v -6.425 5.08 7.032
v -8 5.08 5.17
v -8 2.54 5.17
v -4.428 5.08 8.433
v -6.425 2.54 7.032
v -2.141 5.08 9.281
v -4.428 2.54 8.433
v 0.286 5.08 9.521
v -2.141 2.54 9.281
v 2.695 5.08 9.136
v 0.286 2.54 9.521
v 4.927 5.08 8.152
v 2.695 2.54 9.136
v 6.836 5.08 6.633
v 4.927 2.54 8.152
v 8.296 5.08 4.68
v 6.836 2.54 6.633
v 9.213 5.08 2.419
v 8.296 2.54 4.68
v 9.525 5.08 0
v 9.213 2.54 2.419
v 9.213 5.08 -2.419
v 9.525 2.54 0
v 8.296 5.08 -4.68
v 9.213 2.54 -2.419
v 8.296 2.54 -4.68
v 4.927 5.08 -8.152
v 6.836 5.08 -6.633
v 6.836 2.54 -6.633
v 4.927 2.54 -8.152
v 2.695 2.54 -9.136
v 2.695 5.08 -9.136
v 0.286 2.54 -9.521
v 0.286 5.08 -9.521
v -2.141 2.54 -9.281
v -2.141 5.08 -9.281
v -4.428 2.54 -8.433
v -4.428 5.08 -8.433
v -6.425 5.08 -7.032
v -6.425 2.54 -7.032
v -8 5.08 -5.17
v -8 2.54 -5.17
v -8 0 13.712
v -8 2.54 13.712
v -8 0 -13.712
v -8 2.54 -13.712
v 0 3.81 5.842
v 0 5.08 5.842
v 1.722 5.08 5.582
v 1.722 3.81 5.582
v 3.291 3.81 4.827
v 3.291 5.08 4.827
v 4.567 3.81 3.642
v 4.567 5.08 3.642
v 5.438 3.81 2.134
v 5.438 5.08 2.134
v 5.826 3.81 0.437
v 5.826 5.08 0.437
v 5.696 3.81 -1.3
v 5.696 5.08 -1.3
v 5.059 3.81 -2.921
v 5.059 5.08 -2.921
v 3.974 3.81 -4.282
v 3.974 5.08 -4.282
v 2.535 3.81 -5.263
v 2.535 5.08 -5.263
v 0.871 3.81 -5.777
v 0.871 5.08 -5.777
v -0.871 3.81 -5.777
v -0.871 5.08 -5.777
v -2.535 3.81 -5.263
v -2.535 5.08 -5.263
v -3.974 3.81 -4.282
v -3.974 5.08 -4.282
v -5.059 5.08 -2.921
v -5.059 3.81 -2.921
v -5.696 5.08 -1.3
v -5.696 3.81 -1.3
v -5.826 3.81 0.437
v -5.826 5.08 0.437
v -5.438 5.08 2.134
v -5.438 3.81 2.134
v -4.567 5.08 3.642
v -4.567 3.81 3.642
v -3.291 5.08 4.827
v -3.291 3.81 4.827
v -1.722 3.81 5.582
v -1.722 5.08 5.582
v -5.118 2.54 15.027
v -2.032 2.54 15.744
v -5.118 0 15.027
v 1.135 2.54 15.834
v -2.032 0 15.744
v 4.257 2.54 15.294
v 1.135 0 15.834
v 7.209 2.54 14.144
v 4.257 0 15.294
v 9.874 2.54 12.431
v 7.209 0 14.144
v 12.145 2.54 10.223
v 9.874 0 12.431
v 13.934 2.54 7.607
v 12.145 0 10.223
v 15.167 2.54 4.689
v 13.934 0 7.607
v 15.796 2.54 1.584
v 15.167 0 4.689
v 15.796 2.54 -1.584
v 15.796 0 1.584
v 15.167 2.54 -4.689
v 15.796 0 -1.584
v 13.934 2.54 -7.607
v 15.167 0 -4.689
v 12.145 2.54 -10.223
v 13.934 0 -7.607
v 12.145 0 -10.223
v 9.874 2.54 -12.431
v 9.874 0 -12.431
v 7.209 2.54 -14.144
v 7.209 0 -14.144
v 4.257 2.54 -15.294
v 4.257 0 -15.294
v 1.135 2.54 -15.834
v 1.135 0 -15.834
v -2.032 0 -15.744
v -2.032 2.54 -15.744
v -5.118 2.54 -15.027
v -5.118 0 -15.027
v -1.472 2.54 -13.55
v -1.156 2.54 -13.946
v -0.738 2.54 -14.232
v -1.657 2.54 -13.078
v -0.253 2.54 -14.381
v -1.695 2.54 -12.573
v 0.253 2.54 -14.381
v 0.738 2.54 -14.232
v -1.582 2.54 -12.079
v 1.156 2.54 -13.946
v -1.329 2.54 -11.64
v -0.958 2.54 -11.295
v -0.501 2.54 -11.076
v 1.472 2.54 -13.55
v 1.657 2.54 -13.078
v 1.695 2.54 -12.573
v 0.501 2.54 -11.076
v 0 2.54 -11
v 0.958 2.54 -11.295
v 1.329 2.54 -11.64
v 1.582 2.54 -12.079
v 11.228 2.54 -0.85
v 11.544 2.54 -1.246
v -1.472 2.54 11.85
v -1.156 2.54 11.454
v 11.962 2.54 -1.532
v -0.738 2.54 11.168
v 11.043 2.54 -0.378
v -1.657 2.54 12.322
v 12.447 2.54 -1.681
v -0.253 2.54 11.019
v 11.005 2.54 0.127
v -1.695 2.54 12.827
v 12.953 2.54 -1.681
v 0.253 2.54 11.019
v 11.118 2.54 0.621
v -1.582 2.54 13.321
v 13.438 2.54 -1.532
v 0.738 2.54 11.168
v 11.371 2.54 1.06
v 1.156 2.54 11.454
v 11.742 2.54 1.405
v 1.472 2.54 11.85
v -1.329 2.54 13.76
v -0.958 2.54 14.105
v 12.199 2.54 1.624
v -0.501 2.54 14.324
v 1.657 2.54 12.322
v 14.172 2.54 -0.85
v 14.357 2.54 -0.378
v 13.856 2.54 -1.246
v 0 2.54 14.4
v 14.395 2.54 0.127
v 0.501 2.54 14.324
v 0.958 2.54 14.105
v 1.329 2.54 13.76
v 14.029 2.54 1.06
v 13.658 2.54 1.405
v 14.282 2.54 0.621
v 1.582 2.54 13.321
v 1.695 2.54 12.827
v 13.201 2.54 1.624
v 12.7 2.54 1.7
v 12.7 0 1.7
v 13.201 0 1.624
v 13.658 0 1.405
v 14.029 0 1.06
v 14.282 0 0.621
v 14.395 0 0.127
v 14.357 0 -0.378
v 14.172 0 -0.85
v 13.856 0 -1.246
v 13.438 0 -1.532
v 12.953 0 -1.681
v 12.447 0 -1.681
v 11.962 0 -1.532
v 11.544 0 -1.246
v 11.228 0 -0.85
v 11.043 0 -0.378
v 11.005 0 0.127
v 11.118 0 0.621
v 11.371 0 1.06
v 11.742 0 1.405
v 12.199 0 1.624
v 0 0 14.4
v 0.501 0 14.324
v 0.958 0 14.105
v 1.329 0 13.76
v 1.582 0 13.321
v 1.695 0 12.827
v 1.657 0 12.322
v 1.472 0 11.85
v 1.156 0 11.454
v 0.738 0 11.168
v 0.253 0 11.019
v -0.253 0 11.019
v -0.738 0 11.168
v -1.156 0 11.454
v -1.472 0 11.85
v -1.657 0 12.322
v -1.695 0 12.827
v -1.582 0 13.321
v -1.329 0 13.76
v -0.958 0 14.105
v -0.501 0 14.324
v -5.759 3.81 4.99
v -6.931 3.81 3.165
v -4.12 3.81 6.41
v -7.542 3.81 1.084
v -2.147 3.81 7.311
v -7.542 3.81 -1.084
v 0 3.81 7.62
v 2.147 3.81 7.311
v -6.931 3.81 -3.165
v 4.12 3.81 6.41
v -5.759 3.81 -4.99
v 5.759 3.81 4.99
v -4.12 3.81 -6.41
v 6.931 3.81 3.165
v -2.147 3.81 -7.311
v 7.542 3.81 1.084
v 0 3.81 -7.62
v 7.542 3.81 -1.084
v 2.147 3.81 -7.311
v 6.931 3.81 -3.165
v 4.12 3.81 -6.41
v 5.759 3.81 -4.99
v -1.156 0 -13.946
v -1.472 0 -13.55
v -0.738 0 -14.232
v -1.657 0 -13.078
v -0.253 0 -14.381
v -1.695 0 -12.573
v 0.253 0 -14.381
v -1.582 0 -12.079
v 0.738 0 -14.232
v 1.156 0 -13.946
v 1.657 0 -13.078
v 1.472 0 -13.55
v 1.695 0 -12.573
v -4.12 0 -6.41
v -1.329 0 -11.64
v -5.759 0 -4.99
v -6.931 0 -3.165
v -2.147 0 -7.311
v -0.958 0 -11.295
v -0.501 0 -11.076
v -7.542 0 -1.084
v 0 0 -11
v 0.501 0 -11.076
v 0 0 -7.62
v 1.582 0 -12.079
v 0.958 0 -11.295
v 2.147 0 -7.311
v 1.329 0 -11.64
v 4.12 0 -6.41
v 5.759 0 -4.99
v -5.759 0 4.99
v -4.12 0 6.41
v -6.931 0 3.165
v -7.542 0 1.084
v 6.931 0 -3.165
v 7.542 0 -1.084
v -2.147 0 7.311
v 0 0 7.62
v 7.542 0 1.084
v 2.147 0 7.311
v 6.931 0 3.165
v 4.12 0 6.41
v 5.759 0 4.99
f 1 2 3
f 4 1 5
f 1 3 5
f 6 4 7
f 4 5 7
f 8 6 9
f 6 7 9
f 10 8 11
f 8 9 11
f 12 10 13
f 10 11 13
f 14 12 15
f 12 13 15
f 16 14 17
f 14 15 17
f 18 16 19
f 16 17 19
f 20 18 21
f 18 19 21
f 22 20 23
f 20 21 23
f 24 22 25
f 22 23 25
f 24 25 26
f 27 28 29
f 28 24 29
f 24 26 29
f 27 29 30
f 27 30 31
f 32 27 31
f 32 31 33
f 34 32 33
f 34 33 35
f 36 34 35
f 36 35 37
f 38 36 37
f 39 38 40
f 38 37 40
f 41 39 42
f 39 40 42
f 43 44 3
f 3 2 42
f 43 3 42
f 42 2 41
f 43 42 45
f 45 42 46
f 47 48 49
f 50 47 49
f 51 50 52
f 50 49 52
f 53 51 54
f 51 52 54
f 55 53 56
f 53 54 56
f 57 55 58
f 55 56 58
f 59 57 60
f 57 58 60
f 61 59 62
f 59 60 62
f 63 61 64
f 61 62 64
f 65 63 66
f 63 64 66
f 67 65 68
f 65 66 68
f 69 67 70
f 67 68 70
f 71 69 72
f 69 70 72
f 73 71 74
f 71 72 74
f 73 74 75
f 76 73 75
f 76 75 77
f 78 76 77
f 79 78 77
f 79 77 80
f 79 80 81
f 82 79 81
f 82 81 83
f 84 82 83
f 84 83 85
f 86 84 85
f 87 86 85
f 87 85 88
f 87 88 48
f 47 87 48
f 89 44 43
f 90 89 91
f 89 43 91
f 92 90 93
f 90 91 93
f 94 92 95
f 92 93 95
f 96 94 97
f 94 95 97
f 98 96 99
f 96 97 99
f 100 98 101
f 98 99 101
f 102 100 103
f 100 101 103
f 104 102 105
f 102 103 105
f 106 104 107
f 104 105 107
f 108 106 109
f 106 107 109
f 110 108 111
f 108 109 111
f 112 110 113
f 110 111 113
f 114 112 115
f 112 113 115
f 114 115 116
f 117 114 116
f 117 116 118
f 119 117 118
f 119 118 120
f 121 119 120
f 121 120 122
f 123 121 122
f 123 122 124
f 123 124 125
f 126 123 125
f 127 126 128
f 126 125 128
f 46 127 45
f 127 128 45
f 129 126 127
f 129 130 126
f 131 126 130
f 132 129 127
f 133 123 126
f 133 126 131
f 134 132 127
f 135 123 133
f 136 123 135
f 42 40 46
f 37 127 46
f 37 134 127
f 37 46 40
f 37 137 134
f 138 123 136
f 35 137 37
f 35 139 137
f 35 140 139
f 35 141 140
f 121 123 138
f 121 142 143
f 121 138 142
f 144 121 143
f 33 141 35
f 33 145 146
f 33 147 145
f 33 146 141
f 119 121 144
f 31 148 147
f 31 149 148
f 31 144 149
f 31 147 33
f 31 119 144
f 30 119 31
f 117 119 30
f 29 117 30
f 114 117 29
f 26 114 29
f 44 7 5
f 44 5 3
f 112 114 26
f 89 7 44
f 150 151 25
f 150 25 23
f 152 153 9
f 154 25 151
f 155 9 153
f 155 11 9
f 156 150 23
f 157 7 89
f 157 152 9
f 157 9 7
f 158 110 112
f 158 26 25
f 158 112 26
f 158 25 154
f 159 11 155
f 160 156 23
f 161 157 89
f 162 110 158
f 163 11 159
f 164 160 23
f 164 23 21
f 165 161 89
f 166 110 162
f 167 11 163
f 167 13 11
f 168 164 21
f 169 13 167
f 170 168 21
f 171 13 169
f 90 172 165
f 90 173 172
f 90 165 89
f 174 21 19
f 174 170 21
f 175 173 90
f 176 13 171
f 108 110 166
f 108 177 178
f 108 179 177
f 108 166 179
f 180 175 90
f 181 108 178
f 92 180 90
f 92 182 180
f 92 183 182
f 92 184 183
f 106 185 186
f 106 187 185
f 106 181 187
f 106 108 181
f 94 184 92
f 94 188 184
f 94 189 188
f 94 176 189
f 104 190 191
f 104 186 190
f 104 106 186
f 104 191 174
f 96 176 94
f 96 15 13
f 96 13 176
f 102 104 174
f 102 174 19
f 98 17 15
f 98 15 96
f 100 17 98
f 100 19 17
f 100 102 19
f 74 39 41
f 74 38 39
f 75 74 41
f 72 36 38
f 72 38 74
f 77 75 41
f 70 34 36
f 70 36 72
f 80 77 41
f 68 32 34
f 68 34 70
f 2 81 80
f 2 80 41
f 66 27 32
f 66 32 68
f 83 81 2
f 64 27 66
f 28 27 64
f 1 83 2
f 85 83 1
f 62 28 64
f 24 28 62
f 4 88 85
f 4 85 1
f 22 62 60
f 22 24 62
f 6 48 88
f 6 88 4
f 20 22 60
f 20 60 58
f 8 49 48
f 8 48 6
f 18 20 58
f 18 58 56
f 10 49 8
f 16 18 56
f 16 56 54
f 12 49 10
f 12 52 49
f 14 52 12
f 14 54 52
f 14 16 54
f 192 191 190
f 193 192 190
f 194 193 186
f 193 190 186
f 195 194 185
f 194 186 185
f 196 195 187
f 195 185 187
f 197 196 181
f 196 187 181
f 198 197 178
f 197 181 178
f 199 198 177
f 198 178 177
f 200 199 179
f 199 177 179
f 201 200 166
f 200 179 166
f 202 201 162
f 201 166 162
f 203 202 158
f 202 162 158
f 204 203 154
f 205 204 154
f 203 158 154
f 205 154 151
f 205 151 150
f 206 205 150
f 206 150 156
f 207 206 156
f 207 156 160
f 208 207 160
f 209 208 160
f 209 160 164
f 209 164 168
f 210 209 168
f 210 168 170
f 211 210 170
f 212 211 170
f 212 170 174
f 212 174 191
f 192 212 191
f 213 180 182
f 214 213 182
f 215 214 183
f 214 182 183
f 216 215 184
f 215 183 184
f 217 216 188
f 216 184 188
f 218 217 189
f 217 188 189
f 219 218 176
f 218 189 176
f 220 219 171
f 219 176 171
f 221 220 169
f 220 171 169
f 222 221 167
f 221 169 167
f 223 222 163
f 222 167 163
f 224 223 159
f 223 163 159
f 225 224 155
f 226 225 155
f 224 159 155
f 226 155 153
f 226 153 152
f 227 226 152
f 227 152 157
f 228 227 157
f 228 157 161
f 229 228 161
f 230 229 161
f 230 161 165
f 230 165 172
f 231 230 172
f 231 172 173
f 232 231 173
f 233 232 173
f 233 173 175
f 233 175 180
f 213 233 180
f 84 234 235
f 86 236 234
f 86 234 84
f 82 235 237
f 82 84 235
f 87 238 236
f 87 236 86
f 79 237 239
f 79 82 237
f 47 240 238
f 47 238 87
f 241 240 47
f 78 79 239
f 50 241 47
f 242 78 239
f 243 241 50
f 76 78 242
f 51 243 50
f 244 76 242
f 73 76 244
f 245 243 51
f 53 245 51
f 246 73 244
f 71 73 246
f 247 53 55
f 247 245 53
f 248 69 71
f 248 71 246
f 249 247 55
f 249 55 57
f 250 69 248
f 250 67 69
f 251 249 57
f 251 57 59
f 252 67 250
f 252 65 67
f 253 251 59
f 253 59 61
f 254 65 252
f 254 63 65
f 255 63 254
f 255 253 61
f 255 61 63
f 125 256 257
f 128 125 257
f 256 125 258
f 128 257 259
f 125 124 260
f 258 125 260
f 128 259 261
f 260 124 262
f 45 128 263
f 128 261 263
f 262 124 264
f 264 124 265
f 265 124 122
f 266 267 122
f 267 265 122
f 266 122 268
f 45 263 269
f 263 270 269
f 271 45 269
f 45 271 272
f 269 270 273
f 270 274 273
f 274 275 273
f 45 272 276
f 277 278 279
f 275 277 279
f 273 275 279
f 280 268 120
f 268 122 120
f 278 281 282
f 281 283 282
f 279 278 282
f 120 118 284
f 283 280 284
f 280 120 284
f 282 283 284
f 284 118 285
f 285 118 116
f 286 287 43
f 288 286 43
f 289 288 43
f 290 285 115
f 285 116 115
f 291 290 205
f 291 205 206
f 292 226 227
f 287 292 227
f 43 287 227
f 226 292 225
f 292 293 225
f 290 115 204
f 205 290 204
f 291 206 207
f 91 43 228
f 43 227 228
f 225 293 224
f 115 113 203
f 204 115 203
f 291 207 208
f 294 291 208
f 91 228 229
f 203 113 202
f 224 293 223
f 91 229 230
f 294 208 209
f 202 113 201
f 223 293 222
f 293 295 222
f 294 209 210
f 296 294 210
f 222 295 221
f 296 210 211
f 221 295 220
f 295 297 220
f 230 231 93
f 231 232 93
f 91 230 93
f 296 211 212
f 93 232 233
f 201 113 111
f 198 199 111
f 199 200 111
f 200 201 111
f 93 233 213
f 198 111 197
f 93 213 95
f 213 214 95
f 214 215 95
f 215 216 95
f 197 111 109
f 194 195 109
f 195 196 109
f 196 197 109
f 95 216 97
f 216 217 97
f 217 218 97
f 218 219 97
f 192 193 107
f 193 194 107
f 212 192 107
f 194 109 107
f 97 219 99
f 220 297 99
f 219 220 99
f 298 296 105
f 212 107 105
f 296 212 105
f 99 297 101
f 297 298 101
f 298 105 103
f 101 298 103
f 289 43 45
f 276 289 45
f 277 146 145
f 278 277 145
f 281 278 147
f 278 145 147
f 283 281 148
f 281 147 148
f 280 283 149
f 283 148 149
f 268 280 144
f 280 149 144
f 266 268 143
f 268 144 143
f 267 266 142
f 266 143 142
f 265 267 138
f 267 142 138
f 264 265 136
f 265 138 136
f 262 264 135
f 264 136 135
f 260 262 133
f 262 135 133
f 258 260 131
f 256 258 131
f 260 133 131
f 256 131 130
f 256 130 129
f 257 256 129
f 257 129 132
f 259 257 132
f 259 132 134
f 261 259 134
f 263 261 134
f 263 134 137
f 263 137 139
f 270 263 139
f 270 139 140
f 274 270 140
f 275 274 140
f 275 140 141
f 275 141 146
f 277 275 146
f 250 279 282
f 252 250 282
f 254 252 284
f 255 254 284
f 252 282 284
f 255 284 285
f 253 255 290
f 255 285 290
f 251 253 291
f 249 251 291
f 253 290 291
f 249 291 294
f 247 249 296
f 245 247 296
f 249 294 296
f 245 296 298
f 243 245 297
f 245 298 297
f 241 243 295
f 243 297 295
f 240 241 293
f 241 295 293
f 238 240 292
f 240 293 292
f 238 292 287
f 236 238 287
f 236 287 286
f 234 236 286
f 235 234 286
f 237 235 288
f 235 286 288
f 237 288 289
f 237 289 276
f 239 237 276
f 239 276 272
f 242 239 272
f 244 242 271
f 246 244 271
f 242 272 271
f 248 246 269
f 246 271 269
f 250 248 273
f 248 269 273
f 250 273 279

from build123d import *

# Parameters (mm, degrees)
SKETCH1_R                      = 15.875
BOSS_EXTRUDE1_DEPTH            = 2.54
SKETCH2_R                      = 9.525
BOSS_EXTRUDE2_DEPTH            = 2.54
SKETCH3_R                      = 7.62
CUT_EXTRUDE1_DEPTH             = 3.81
CUT_EXTRUDE2_REACH             = 25.018
SKETCH4_R                      = 5.842
CUT_EXTRUDE3_REACH             = 24.594
SKETCH5_R                      = 1.7
CUT_EXTRUDE5_REACH             = 24.594
CUT_EXTRUDE5_DIRECTION_2_DEPTH = 2.794


with BuildPart() as part:
    # Sketch1 → Boss-Extrude1 (new body)
    with BuildSketch(Plane(origin=(0, 0, 0), x_dir=(1, 0, 0), z_dir=(0, 1, 0))):
        with Locations(Location((0, 0, 0), (0, 0, 270))):
            Circle(SKETCH1_R)
    extrude(amount=BOSS_EXTRUDE1_DEPTH)

    # Sketch2 → Boss-Extrude2 (add)
    with BuildSketch(Plane(origin=(0, 2.54, 0), x_dir=(1, 0, 0), z_dir=(0, 1, 0))):
        with Locations(Location((0, 0, 0), (0, 0, 270))):
            Circle(SKETCH2_R)
    extrude(amount=BOSS_EXTRUDE2_DEPTH)

    # Sketch3 → Cut-Extrude1 (cut)
    with BuildSketch(Plane.XZ):
        with Locations(Location((0, 0, 0), (0, 0, 270))):
            Circle(SKETCH3_R)
    extrude(amount=-CUT_EXTRUDE1_DEPTH, mode=Mode.SUBTRACT)

    # Sketch4 → Cut-Extrude2 (cut, up to next)
    with BuildSketch(Plane(origin=(0, 5.08, 0), x_dir=(1, 0, 0), z_dir=(0, 1, 0)), mode=Mode.PRIVATE) as cut_extrude2_sk1:
        with Locations(Location((0, 0, 0), (0, 0, 270))):
            Circle(SKETCH4_R)
    cut_extrude2_tool1 = extrude(cut_extrude2_sk1.sketch, amount=-CUT_EXTRUDE2_REACH, mode=Mode.PRIVATE) & part.part
    add(cut_extrude2_tool1.solids().sort_by_distance((0, 5.08, 0))[0], mode=Mode.SUBTRACT)

    # Sketch5 → Cut-Extrude3 (cut, up to next)
    with BuildSketch(Plane(origin=(0, 2.54, 0), x_dir=(1, 0, 0), z_dir=(0, 1, 0)), mode=Mode.PRIVATE) as cut_extrude3_sk1:
        with Locations(Location((0, 12.7, 0), (0, 0, 270))):
            Circle(SKETCH5_R)
    cut_extrude3_tool1 = extrude(cut_extrude3_sk1.sketch, amount=-CUT_EXTRUDE3_REACH, mode=Mode.PRIVATE) & part.part
    # Sketch5 → Cut-Extrude3 (cut, up to next)
    with BuildSketch(Plane(origin=(0, 2.54, 0), x_dir=(1, 0, 0), z_dir=(0, 1, 0)), mode=Mode.PRIVATE) as cut_extrude3_sk2:
        with Locations(Location((12.7, 0, 0), (0, 0, 270))):
            Circle(SKETCH5_R)
    cut_extrude3_tool2 = extrude(cut_extrude3_sk2.sketch, amount=-CUT_EXTRUDE3_REACH, mode=Mode.PRIVATE) & part.part
    # Sketch5 → Cut-Extrude3 (cut, up to next)
    with BuildSketch(Plane(origin=(0, 2.54, 0), x_dir=(1, 0, 0), z_dir=(0, 1, 0)), mode=Mode.PRIVATE) as cut_extrude3_sk3:
        with Locations(Location((0, -12.7, 0), (0, 0, 270))):
            Circle(SKETCH5_R)
    cut_extrude3_tool3 = extrude(cut_extrude3_sk3.sketch, amount=-CUT_EXTRUDE3_REACH, mode=Mode.PRIVATE) & part.part
    # Sketch5 → Cut-Extrude3 (cut, up to next)
    with BuildSketch(Plane(origin=(0, 2.54, 0), x_dir=(1, 0, 0), z_dir=(0, 1, 0)), mode=Mode.PRIVATE) as cut_extrude3_sk4:
        with Locations(Location((-12.7, 0, 0), (0, 0, 270))):
            Circle(SKETCH5_R)
    cut_extrude3_tool4 = extrude(cut_extrude3_sk4.sketch, amount=-CUT_EXTRUDE3_REACH, mode=Mode.PRIVATE) & part.part
    add(cut_extrude3_tool1.solids().sort_by_distance((0, 2.54, -12.7))[0], mode=Mode.SUBTRACT)
    add(cut_extrude3_tool2.solids().sort_by_distance((12.7, 2.54, 0))[0], mode=Mode.SUBTRACT)
    add(cut_extrude3_tool3.solids().sort_by_distance((0, 2.54, 12.7))[0], mode=Mode.SUBTRACT)
    add(cut_extrude3_tool4.solids().sort_by_distance((-12.7, 2.54, 0))[0], mode=Mode.SUBTRACT)

    # Sketch6 → Cut-Extrude5 (cut, up to next)
    with BuildSketch(Plane(origin=(0, 2.54, 0), x_dir=(1, 0, 0), z_dir=(0, 1, 0)), mode=Mode.PRIVATE) as cut_extrude5_sk1:
        with BuildLine():
            Line((-8, -13.711878974), (-8, 13.711878974))
            ThreePointArc((-8, 13.711878974), (-15.875, 0), (-8, -13.711878974))
        make_face()
    cut_extrude5_tool1 = extrude(cut_extrude5_sk1.sketch, amount=-CUT_EXTRUDE5_REACH, mode=Mode.PRIVATE) & part.part
    add(cut_extrude5_tool1.solids().sort_by_distance((-11.228338, 2.54, 0))[0], mode=Mode.SUBTRACT)

    # Sketch6 → Cut-Extrude5 direction 2 (cut)
    with BuildSketch(Plane(origin=(0, 2.54, 0), x_dir=(1, 0, 0), z_dir=(0, 1, 0))):
        with BuildLine():
            Line((-8, -13.711878974), (-8, 13.711878974))
            ThreePointArc((-8, 13.711878974), (-15.875, 0), (-8, -13.711878974))
        make_face()
    extrude(amount=CUT_EXTRUDE5_DIRECTION_2_DEPTH, mode=Mode.SUBTRACT)


solid = part.part
